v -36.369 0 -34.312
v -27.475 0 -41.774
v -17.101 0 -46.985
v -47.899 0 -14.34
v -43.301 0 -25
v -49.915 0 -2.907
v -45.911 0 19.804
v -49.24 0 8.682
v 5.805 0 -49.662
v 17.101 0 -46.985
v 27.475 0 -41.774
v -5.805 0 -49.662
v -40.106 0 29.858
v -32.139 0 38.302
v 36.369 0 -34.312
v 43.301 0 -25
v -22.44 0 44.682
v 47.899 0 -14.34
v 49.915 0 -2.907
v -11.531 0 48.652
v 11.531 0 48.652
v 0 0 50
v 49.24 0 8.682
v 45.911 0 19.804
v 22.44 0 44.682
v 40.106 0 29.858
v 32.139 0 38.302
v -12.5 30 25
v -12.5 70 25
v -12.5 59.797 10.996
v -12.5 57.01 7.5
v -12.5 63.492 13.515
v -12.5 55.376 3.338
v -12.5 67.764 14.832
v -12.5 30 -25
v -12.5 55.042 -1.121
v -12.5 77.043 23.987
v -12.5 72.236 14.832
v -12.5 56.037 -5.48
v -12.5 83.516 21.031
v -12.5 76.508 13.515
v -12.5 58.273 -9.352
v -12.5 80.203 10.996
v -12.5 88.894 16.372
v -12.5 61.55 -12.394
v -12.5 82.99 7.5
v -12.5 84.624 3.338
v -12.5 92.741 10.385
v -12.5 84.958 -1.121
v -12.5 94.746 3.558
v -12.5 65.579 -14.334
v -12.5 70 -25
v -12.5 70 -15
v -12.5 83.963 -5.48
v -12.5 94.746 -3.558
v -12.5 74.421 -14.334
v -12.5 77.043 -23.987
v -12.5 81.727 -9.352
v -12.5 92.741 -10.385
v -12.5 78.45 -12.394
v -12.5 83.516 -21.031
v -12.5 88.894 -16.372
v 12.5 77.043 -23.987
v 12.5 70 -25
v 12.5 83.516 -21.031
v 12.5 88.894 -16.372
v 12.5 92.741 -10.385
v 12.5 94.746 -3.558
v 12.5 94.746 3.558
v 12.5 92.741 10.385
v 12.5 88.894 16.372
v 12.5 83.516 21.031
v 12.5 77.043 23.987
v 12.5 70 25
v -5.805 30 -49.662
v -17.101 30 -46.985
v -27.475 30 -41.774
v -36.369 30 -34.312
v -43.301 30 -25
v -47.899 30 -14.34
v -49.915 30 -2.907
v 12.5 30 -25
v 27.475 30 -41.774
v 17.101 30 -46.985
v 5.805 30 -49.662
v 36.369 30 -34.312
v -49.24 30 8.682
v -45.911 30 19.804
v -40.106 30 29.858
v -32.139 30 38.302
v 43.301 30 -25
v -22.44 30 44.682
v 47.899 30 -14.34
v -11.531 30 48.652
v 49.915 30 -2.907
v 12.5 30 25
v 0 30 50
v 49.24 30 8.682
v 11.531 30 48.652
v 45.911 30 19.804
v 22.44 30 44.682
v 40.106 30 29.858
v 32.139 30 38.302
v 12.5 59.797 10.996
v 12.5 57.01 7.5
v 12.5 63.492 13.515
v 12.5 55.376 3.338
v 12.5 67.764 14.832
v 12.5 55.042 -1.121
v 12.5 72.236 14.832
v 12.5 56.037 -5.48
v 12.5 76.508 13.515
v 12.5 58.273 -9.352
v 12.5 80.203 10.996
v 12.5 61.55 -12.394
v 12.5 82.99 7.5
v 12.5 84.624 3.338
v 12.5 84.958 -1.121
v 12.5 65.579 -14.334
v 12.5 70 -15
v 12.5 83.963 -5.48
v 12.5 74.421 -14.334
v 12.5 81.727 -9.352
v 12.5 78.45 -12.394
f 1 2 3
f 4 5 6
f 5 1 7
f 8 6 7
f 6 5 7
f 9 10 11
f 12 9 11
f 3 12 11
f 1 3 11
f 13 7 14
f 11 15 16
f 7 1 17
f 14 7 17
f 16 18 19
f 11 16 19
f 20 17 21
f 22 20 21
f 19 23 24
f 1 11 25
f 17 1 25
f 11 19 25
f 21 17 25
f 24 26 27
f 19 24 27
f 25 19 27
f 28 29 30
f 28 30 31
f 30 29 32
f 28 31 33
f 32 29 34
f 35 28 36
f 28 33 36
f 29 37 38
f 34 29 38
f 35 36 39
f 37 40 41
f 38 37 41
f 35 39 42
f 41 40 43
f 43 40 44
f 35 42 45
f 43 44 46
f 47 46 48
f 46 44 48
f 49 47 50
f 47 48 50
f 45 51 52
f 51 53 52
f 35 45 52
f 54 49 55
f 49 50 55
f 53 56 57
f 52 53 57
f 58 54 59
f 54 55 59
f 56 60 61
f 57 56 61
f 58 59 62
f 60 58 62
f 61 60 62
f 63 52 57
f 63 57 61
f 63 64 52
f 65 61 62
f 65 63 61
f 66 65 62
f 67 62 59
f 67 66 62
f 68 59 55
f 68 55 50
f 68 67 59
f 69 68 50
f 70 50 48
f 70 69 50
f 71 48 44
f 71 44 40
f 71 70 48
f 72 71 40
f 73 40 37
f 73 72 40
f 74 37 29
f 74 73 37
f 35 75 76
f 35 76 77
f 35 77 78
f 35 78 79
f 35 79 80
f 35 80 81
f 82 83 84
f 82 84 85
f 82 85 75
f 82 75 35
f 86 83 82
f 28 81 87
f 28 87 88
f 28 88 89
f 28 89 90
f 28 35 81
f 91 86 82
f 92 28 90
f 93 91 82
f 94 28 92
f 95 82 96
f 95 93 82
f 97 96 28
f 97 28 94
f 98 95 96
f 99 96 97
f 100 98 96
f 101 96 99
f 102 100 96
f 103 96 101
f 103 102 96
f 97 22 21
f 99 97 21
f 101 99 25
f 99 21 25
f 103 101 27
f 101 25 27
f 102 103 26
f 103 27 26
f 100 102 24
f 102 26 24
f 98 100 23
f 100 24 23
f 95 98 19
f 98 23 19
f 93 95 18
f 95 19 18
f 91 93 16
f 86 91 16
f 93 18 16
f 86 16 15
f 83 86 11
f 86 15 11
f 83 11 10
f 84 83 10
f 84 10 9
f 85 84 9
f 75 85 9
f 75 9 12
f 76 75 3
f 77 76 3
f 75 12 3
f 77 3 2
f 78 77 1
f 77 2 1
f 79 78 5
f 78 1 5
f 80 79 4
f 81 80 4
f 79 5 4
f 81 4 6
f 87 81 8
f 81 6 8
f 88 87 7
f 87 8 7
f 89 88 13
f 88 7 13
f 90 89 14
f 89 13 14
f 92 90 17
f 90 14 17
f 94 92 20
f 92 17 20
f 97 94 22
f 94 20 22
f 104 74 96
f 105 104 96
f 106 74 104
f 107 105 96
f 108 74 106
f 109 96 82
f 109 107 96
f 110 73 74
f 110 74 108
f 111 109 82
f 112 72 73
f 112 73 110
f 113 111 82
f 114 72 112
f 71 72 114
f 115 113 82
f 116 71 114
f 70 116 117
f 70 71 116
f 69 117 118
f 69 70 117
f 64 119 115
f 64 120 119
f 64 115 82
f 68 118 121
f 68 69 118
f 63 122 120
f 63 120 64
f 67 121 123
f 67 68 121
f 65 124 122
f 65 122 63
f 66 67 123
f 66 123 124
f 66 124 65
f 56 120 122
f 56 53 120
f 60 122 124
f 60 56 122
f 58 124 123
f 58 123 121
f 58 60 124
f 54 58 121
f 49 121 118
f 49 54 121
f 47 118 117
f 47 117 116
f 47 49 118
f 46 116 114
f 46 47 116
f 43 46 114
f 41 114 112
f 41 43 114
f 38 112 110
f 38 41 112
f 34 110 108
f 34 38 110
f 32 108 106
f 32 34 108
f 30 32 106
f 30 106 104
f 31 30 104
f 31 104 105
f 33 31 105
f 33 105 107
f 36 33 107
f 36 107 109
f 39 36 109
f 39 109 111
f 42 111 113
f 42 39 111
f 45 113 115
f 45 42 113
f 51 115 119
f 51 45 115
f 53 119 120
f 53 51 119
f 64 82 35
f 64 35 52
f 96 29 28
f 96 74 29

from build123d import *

# Parameters (mm, degrees)
SKETCH1_R           = 50
BOSS_EXTRUDE1_DEPTH = 30
SKETCH2_R           = 15
BOSS_EXTRUDE2_DEPTH = 12.5


with BuildPart() as part:
    # Sketch1 → Boss-Extrude1 (new body)
    with BuildSketch(Plane(origin=(0, 0, 0), x_dir=(1, 0, 0), z_dir=(0, 1, 0))):
        with Locations(Location((0, 0, 0), (0, 0, 270))):
            Circle(SKETCH1_R)
    extrude(amount=BOSS_EXTRUDE1_DEPTH)

    # Sketch2 → Boss-Extrude2 (add, symmetric)
    with BuildSketch(Plane(origin=(0, 0, 0), x_dir=(0, 0, -1), z_dir=(1, 0, 0))):
        with BuildLine():
            Line((-25, 70), (-25, 30))
            Line((-25, 30), (25, 30))
            Line((25, 30), (25, 70))
            ThreePointArc((25, 70), (0, 95), (-25, 70))
        make_face()
        with Locations((0, 70)):
            Circle(SKETCH2_R, mode=Mode.SUBTRACT)
    extrude(amount=BOSS_EXTRUDE2_DEPTH, both=True)


solid = part.part
